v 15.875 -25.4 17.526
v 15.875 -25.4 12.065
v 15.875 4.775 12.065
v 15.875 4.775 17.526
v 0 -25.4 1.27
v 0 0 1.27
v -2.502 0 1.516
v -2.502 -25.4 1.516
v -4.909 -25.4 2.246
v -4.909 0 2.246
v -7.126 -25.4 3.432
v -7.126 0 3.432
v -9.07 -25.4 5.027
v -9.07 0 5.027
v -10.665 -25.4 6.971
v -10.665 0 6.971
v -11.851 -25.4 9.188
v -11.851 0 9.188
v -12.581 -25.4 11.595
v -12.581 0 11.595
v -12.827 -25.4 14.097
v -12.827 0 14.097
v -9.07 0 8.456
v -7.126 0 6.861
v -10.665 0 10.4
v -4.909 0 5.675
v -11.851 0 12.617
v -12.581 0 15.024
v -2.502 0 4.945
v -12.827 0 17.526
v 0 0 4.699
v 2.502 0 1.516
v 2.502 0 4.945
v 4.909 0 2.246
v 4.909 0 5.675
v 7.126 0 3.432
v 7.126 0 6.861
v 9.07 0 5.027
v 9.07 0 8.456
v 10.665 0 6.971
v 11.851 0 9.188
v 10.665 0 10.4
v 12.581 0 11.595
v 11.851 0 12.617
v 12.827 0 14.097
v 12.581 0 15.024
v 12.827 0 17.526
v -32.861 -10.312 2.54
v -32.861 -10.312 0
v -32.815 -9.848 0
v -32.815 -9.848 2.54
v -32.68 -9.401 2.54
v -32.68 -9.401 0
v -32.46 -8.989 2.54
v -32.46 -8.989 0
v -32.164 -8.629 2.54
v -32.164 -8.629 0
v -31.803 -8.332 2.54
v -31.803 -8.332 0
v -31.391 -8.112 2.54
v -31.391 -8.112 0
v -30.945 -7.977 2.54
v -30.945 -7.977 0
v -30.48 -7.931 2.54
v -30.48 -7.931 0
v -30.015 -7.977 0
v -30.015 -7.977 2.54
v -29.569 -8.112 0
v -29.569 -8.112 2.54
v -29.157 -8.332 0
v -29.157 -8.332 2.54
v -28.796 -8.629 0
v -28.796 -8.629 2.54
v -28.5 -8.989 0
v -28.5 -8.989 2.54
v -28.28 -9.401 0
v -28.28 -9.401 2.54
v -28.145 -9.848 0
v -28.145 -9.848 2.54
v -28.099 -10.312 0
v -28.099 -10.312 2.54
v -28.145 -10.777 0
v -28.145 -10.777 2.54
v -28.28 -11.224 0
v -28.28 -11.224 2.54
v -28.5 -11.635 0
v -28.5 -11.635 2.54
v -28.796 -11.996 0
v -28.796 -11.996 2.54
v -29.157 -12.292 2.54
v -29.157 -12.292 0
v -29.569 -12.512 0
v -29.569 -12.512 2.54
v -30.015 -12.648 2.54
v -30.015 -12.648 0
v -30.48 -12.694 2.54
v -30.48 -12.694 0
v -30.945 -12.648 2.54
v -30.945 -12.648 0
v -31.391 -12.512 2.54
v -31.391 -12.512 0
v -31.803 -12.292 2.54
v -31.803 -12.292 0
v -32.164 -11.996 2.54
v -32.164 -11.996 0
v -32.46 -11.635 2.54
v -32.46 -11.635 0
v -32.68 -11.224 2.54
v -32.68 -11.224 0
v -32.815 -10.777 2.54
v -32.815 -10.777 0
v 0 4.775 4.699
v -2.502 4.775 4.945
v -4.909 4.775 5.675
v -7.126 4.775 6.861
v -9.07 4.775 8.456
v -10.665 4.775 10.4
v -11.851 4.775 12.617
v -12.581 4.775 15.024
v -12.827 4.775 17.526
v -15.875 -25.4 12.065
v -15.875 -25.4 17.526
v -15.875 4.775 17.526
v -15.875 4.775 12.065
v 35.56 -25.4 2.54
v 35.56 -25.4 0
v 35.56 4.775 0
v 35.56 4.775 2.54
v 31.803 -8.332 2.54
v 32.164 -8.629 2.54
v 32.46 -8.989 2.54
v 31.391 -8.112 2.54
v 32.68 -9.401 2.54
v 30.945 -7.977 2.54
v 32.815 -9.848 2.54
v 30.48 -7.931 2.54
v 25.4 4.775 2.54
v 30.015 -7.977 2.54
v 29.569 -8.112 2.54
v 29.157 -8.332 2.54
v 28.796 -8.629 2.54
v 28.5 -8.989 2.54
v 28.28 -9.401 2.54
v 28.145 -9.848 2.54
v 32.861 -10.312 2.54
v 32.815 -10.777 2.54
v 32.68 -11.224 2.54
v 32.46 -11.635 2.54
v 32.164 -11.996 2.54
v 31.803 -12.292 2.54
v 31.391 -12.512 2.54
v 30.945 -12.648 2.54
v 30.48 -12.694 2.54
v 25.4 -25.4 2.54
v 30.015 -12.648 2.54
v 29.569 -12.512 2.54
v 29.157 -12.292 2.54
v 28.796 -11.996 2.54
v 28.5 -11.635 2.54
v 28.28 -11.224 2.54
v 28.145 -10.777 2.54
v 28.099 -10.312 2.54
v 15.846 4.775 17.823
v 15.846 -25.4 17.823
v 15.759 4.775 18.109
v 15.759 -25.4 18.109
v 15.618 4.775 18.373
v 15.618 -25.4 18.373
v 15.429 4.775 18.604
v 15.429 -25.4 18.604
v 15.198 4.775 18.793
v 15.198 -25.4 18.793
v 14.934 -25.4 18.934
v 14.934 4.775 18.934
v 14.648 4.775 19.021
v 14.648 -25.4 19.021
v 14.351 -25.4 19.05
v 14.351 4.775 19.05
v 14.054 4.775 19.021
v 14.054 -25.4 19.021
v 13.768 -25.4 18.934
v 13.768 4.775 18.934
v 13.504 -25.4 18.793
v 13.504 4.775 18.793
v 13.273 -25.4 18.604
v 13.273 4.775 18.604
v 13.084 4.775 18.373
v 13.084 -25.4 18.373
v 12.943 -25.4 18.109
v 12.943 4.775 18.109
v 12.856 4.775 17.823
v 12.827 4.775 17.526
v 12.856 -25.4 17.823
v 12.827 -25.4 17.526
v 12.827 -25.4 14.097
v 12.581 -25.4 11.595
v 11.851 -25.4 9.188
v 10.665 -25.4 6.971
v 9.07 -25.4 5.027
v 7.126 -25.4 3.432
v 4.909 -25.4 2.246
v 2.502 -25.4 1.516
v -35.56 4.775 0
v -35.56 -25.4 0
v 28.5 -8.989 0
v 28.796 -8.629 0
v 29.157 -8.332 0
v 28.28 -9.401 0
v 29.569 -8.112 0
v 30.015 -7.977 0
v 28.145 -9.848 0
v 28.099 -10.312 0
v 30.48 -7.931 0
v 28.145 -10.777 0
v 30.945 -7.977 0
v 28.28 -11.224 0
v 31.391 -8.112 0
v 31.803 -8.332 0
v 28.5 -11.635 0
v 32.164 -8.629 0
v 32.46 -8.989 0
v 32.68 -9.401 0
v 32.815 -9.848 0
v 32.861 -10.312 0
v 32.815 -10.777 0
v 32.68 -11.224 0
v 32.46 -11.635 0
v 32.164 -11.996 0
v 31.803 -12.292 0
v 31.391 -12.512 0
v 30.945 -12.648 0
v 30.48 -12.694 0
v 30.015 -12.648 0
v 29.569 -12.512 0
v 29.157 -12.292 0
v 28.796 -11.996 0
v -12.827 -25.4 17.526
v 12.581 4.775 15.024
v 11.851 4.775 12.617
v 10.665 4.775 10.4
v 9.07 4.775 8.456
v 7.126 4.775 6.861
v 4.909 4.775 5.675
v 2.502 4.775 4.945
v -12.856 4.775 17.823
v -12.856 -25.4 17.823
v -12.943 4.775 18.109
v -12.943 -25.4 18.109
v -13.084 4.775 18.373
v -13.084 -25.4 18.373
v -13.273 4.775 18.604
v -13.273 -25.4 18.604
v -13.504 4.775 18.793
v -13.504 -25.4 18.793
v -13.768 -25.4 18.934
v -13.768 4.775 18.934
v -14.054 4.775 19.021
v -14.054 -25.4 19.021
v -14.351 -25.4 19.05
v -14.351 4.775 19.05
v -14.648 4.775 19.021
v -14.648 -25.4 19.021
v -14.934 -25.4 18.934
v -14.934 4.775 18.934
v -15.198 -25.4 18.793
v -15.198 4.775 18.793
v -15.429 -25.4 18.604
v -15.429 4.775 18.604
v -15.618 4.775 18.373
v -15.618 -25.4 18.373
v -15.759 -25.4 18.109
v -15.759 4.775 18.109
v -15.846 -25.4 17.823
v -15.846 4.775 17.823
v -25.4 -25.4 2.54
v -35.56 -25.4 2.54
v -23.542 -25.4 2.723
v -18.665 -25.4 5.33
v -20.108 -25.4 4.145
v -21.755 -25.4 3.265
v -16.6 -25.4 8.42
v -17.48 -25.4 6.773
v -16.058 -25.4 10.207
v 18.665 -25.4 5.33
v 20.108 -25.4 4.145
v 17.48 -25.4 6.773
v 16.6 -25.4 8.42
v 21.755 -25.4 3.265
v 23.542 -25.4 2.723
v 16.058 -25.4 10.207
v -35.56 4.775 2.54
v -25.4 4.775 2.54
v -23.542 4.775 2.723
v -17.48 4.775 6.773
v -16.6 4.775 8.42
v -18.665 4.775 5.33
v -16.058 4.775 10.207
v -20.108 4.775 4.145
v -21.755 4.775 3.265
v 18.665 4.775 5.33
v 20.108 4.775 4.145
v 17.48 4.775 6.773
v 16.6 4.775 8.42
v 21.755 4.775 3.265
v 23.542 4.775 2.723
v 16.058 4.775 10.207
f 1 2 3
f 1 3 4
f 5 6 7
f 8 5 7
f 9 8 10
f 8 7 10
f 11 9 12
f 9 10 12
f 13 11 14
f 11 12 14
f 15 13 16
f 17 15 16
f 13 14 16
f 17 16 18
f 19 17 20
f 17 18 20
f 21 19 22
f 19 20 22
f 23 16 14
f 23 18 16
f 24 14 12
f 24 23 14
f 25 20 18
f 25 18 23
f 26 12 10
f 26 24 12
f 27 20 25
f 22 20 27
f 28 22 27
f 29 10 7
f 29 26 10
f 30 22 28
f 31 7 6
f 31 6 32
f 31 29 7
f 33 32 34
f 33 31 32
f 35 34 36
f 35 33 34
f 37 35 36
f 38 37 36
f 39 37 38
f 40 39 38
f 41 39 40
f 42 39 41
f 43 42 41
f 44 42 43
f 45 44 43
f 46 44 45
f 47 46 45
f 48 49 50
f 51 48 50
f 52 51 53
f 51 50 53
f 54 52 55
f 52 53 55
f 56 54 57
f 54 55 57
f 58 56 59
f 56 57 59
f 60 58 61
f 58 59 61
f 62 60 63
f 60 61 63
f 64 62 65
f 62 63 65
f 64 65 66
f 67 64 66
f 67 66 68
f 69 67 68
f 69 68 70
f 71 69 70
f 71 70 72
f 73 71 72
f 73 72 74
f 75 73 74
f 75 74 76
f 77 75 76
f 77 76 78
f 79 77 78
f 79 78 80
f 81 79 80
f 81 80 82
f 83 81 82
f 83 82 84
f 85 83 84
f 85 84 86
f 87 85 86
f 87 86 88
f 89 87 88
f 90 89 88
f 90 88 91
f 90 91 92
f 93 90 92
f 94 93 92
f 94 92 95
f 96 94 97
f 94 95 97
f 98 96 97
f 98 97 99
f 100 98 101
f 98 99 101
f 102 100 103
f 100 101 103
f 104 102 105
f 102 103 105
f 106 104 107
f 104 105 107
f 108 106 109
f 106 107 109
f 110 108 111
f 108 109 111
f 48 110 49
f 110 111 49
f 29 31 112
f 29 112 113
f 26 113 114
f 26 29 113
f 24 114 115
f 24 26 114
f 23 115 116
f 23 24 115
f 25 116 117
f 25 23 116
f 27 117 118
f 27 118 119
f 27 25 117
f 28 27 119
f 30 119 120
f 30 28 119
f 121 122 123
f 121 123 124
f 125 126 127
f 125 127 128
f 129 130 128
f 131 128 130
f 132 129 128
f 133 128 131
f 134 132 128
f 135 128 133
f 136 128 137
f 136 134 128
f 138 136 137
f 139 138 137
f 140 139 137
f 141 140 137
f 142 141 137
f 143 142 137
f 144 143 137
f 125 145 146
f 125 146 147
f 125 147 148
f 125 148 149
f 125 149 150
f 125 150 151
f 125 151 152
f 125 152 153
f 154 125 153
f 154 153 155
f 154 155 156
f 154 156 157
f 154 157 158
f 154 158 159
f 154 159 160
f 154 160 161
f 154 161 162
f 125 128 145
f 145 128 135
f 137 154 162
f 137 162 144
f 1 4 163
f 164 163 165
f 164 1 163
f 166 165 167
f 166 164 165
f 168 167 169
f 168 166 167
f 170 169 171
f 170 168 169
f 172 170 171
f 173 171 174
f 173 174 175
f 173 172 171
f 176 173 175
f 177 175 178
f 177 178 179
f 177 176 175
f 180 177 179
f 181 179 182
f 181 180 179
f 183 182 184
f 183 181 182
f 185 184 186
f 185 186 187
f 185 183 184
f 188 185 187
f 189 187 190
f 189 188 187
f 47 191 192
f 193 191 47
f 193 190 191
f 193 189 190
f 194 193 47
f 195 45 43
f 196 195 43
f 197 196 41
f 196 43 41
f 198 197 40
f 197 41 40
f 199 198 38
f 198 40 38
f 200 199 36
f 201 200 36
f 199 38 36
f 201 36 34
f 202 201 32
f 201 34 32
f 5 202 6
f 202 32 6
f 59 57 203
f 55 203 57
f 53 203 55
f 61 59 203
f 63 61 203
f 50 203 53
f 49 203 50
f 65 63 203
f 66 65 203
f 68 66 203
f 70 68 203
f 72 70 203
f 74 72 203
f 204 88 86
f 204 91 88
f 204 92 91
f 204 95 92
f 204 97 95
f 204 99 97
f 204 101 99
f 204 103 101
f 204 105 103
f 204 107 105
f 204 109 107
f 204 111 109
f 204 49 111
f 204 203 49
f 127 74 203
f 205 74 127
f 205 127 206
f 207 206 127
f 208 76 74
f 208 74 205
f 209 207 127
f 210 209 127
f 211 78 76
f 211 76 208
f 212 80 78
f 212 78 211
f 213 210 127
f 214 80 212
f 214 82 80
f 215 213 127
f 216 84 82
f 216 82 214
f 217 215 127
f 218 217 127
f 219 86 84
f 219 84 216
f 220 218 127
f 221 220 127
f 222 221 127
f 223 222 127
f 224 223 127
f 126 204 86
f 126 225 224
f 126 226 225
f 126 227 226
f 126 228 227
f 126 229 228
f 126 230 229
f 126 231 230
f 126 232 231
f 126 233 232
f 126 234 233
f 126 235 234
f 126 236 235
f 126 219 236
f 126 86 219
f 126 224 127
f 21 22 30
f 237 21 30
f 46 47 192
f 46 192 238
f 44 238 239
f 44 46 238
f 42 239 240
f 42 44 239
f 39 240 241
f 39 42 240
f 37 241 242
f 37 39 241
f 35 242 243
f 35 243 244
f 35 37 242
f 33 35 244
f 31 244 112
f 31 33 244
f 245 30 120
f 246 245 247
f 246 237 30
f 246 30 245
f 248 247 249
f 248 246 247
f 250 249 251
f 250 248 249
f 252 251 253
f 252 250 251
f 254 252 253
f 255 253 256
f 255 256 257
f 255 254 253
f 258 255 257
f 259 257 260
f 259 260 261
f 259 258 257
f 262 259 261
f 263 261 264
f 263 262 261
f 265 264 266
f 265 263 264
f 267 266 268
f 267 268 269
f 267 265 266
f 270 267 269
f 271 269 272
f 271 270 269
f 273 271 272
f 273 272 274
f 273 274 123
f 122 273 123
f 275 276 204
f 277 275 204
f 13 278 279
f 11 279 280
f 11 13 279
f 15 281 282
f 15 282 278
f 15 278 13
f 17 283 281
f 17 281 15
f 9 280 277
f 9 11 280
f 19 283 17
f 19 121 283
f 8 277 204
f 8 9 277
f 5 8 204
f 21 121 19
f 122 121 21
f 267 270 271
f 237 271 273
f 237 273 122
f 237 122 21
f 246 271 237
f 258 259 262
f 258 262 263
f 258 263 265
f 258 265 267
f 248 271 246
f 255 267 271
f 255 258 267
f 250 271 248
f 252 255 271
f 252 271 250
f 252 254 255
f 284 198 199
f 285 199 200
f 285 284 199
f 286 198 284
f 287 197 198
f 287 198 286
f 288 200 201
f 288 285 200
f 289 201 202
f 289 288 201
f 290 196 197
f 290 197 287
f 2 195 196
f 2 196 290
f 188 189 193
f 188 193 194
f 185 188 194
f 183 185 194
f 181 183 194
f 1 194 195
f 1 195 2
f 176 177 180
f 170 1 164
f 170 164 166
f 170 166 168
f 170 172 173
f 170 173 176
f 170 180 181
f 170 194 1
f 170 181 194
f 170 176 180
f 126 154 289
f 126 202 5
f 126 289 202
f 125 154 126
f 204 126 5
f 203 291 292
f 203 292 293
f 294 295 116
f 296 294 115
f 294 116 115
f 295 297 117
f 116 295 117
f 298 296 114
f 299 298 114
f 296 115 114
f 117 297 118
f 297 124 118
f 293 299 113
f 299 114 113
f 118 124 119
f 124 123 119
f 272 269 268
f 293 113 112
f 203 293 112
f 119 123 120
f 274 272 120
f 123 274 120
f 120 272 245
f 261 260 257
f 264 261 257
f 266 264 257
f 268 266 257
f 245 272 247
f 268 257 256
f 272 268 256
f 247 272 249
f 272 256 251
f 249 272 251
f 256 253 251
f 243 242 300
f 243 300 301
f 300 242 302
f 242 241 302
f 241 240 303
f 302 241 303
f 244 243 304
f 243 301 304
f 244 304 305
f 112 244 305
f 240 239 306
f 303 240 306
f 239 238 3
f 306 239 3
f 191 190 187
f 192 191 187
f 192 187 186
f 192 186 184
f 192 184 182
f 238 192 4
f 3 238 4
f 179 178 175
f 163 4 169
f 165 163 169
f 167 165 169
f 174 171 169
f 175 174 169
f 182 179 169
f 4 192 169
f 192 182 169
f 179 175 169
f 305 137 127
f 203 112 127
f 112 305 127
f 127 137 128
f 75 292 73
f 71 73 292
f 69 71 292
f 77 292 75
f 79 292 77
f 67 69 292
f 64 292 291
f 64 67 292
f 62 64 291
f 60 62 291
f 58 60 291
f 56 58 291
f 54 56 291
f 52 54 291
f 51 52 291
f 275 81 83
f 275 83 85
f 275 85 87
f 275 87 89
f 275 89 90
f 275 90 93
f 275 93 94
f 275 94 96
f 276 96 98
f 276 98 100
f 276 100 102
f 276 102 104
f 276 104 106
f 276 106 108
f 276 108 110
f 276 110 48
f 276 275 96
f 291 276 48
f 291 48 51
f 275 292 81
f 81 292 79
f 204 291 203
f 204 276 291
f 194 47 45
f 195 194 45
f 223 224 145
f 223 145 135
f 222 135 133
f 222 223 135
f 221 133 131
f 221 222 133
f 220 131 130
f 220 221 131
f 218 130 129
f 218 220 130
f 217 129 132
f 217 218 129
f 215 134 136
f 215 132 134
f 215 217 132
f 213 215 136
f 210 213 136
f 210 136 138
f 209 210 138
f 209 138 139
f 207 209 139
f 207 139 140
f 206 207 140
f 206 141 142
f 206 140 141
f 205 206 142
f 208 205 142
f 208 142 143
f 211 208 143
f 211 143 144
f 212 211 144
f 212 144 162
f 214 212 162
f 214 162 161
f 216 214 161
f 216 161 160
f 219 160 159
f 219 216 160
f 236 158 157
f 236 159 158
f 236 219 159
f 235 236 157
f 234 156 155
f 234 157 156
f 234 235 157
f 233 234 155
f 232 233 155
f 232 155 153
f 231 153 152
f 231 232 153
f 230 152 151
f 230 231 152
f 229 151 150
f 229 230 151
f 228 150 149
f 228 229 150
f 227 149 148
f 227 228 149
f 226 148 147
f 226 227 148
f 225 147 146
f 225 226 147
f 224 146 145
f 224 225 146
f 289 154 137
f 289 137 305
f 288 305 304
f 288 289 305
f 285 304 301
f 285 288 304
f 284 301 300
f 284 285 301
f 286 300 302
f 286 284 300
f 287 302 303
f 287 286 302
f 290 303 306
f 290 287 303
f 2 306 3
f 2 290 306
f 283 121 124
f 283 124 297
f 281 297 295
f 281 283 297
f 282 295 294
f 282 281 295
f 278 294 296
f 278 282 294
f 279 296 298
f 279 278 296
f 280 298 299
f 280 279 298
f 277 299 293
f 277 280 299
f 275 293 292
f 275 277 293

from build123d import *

# Parameters (mm, degrees)
F1_DEPTH = 25.4
F2_DEPTH = 4.7752
F4_D     = 4.7625


# Not quite as in the source:
# - a pattern or mirror of a feature is missing from the dataset's text; its kind, count and spacing are read off the source's solid


with BuildPart() as f1:
    # F0 (on Front) → F1 (new body)
    with BuildSketch(Plane.XZ):
        with BuildLine():
            Line((-35.56, 0), (0, 0))
            Line((0, 0), (35.56, 0))
            Line((35.56, 0), (35.56, 2.54))
            Line((35.56, 2.54), (25.4, 2.54))
            ThreePointArc((25.4, 2.54), (18.6648079092, 5.3298079092), (15.875, 12.065))
            Line((15.875, 12.065), (15.875, 17.526))
            ThreePointArc((15.875, 17.526), (14.351, 19.05), (12.827, 17.526))
            Line((12.827, 17.526), (12.827, 14.097))
            ThreePointArc((12.827, 14.097), (9.0700586823, 5.0269413177), (0, 1.27))
            ThreePointArc((0, 1.27), (-9.0700586823, 5.0269413177), (-12.827, 14.097))
            Line((-12.827, 14.097), (-12.827, 17.526))
            ThreePointArc((-12.827, 17.526), (-14.351, 19.05), (-15.875, 17.526))
            Line((-15.875, 17.526), (-15.875, 12.065))
            ThreePointArc((-15.875, 12.065), (-18.6648079092, 5.3298079092), (-25.4, 2.54))
            Line((-25.4, 2.54), (-35.56, 2.54))
            Line((-35.56, 2.54), (-35.56, 0))
        make_face()
    extrude(amount=F1_DEPTH)

    # F0 (on Front) → F2 (join)
    with BuildSketch(Plane.XZ):
        with BuildLine():
            Line((-35.56, 0), (0, 0))
            Line((0, 0), (35.56, 0))
            Line((35.56, 0), (35.56, 2.54))
            Line((35.56, 2.54), (25.4, 2.54))
            ThreePointArc((25.4, 2.54), (18.6648079092, 5.3298079092), (15.875, 12.065))
            Line((15.875, 12.065), (15.875, 17.526))
            ThreePointArc((15.875, 17.526), (14.351, 19.05), (12.827, 17.526))
            Line((12.827, 17.526), (12.827, 14.097))
            ThreePointArc((12.827, 14.097), (9.0700586823, 5.0269413177), (0, 1.27))
            ThreePointArc((0, 1.27), (-9.0700586823, 5.0269413177), (-12.827, 14.097))
            Line((-12.827, 14.097), (-12.827, 17.526))
            ThreePointArc((-12.827, 17.526), (-14.351, 19.05), (-15.875, 17.526))
            Line((-15.875, 17.526), (-15.875, 12.065))
            ThreePointArc((-15.875, 12.065), (-18.6648079092, 5.3298079092), (-25.4, 2.54))
            Line((-25.4, 2.54), (-35.56, 2.54))
            Line((-35.56, 2.54), (-35.56, 0))
        make_face()
        with BuildLine():
            ThreePointArc((0, 4.699), (-9.0700586823, 8.4559413177), (-12.827, 17.526))
            Line((-12.827, 17.526), (-12.827, 14.097))
            ThreePointArc((-12.827, 14.097), (-9.0700586823, 5.0269413177), (0, 1.27))
            ThreePointArc((0, 1.27), (9.0700586823, 5.0269413177), (12.827, 14.097))
            Line((12.827, 14.097), (12.827, 17.526))
            ThreePointArc((12.827, 17.526), (9.0700586823, 8.4559413177), (0, 4.699))
        make_face()
    extrude(amount=-F2_DEPTH)

    # F4 (through all)
    with Locations(Plane.XY.offset(2.54)):
        with Locations((-30.48, -10.3124)):
            f4 = Hole(F4_D / 2)

    # F4_copies: F4 across plane
    add(f4.mirror(Plane(origin=(0, 0, 0), x_dir=(0, 0, 1), z_dir=(1, 0, 0))), mode=Mode.SUBTRACT)


solid = f1.part
